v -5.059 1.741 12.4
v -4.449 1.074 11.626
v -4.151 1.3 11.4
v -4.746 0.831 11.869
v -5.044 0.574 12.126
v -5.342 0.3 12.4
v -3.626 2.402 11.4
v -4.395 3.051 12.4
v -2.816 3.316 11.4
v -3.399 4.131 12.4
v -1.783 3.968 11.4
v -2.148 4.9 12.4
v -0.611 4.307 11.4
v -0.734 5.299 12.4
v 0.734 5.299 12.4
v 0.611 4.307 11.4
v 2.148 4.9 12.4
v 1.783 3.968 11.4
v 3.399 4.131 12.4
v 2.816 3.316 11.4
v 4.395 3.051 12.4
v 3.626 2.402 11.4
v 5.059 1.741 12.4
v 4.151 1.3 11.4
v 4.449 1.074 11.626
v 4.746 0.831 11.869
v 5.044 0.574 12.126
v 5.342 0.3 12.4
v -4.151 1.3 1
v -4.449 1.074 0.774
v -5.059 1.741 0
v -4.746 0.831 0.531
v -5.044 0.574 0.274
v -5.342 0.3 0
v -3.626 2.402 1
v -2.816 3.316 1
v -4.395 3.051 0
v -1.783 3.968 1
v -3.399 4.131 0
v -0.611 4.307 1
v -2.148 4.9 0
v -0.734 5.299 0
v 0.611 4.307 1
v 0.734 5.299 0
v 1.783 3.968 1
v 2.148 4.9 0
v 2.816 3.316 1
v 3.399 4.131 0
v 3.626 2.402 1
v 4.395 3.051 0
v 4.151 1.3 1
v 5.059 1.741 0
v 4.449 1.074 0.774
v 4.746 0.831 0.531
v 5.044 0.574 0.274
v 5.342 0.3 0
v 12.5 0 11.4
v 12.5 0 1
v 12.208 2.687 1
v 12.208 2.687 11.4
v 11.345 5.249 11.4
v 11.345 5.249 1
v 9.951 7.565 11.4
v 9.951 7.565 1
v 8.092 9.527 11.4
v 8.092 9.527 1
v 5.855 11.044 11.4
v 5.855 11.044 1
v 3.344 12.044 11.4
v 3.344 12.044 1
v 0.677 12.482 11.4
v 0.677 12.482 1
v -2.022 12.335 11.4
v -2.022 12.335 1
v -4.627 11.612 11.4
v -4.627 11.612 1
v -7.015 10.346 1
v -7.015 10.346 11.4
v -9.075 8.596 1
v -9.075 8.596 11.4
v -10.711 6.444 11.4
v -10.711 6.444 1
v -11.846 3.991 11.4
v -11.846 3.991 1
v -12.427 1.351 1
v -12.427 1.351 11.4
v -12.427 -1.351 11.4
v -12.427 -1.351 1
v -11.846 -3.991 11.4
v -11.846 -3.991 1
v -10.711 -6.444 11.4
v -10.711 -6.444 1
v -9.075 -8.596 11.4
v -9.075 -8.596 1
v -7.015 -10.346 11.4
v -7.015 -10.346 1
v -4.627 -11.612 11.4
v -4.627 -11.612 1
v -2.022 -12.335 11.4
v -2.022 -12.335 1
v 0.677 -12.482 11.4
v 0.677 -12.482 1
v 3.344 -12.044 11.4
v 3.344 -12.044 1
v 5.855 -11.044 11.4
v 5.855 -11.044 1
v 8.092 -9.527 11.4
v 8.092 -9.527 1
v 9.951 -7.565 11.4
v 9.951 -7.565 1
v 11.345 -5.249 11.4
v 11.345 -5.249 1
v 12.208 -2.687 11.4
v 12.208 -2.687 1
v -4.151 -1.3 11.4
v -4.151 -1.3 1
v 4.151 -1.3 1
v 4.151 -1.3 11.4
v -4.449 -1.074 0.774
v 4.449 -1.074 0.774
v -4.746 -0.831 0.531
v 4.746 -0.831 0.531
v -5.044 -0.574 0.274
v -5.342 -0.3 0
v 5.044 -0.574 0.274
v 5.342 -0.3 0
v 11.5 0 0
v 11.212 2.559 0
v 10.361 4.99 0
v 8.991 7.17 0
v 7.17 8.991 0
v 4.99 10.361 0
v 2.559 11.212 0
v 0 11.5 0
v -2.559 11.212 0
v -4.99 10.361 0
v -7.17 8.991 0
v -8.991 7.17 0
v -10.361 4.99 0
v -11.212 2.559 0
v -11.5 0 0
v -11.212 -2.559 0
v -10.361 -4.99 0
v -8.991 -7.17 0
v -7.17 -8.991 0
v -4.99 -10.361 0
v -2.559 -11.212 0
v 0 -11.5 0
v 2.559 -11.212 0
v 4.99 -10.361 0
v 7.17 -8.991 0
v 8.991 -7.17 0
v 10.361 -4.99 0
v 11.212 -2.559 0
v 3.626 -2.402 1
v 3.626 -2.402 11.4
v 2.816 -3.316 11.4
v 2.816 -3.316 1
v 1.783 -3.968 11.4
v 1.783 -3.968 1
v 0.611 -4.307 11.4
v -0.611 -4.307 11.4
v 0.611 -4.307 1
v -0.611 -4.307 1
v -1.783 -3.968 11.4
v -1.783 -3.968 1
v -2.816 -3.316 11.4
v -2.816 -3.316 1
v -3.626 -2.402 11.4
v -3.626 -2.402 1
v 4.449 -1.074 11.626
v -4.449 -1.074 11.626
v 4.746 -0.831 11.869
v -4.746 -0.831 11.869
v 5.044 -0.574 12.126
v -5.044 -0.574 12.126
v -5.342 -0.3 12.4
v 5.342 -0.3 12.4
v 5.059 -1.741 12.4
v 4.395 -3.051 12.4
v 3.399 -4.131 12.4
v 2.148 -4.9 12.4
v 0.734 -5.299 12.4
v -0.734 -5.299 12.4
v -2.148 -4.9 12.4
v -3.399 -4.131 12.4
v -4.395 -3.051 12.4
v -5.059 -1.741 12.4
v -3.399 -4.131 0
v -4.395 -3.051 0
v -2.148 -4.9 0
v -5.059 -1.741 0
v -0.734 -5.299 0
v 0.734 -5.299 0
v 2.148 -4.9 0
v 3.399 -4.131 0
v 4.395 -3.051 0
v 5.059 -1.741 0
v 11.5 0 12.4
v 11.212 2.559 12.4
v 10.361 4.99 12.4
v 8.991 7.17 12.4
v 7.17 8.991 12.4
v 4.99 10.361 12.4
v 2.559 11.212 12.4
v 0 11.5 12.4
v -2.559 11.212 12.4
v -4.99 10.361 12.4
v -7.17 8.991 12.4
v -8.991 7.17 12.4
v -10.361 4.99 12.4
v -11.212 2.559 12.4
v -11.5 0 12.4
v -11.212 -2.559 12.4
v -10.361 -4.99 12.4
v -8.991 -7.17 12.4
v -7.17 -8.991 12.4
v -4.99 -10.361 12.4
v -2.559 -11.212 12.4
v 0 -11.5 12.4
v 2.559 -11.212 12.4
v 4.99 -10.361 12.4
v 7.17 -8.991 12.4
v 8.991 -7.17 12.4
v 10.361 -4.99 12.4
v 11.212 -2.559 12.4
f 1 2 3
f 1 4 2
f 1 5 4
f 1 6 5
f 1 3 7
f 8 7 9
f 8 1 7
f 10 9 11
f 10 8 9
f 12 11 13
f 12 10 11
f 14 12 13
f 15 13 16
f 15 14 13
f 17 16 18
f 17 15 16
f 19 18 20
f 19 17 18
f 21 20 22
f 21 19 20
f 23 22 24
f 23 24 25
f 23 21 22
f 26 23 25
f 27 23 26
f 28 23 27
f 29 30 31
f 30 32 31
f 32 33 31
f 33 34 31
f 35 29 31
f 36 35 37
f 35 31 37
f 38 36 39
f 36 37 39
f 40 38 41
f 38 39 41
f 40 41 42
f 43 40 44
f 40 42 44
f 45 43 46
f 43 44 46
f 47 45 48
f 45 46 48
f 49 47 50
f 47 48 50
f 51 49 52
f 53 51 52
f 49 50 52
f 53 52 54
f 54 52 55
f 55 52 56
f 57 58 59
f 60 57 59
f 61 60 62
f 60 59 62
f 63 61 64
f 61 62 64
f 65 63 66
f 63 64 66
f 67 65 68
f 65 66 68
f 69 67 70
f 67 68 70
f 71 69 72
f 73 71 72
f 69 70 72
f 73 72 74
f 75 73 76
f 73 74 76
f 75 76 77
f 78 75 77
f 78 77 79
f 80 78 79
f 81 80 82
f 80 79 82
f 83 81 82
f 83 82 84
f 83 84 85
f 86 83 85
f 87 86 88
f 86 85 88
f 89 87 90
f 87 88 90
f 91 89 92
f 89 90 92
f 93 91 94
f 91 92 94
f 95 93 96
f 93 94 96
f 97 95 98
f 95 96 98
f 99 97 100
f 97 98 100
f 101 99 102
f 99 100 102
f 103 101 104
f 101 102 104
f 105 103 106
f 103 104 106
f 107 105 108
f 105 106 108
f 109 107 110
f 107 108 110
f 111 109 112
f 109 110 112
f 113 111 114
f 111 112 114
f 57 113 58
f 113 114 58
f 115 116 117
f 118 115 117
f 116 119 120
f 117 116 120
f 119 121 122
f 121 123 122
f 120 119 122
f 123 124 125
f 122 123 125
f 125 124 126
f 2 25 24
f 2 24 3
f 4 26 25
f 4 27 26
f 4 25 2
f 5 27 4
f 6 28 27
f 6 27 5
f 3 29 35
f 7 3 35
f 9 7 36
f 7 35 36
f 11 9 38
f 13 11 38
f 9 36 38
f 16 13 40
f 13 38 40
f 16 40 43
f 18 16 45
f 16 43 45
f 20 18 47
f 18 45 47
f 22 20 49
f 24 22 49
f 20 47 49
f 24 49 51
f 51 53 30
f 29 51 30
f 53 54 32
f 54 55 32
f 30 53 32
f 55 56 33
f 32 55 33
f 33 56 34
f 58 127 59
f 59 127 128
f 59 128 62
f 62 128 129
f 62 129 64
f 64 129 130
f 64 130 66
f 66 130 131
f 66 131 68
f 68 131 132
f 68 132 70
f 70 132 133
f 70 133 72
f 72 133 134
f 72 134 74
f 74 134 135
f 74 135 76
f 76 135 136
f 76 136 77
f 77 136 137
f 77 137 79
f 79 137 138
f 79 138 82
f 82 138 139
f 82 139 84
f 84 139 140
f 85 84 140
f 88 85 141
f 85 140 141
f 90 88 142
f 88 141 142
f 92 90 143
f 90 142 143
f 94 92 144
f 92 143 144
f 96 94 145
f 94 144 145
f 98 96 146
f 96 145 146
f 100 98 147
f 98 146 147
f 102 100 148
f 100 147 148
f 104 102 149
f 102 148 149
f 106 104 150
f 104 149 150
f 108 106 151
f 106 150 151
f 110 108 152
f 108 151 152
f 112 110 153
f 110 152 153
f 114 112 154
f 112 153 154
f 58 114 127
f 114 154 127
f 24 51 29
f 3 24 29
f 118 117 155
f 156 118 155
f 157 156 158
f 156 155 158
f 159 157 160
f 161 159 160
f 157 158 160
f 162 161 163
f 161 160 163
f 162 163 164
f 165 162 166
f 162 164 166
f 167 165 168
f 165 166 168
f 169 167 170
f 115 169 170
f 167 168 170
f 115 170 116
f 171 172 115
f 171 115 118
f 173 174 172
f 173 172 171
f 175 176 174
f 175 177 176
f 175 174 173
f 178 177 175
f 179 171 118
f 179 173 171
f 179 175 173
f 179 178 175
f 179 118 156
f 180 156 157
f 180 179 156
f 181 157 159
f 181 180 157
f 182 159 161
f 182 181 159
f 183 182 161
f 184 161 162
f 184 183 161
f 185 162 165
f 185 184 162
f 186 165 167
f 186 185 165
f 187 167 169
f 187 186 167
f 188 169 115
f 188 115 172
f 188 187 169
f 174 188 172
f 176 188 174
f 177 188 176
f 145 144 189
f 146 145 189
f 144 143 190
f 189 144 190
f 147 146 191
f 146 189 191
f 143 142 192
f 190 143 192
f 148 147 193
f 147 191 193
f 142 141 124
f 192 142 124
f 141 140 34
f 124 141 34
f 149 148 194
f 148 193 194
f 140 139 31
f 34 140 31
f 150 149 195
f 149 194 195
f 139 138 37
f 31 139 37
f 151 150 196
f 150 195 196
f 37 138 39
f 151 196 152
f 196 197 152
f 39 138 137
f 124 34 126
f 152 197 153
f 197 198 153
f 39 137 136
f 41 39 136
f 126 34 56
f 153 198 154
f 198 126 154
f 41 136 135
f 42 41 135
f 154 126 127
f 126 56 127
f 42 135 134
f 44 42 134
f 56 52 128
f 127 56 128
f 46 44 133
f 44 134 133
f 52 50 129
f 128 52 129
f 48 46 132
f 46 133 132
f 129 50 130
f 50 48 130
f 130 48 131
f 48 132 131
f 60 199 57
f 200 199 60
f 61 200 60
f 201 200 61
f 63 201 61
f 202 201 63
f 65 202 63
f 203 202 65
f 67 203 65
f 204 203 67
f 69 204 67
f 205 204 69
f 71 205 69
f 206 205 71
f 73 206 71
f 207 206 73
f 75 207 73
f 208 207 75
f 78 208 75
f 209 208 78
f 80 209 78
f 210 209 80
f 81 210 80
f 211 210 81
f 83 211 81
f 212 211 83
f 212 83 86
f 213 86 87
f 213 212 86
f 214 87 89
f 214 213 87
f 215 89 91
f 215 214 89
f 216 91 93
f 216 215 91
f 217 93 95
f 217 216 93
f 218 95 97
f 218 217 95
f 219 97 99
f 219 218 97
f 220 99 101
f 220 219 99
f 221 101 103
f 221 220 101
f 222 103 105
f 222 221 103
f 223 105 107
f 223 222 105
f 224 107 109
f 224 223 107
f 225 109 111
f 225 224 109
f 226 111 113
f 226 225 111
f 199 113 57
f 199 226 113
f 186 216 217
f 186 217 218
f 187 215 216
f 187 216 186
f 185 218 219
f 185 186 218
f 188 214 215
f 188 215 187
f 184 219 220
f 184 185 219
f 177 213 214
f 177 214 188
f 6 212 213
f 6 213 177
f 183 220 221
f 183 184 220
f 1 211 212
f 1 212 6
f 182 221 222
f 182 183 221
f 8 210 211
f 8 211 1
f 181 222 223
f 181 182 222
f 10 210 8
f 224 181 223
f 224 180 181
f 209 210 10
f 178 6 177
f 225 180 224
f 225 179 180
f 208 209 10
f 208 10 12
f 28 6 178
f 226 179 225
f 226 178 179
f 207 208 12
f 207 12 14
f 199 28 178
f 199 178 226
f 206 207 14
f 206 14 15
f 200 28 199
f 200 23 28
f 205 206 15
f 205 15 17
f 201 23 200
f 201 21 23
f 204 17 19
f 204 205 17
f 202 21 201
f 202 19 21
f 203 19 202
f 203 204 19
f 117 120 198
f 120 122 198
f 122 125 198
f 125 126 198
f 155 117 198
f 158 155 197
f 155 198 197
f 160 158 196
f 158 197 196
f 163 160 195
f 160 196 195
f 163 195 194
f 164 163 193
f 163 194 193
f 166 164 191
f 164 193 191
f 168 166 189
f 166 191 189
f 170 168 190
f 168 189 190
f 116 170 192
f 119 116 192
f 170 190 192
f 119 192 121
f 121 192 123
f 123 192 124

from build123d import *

# Parameters (mm, degrees)
F0_R     = 12.5
F1_DEPTH = 12.4
F2_SIZE  = 1


with BuildPart() as f1:
    # F0 (on Top) → F1 (new body)
    with BuildSketch(Plane.XY):
        Circle(F0_R)
        with BuildLine():
            ThreePointArc((-4.1512046444, 1.3), (0, 4.35), (4.1512046444, 1.3))
            Line((4.1512046444, 1.3), (5, 1.3))
            Line((5, 1.3), (5, -1.3))
            Line((5, -1.3), (4.1512046444, -1.3))
            ThreePointArc((4.1512046444, -1.3), (0, -4.35), (-4.1512046444, -1.3))
            Line((-4.1512046444, -1.3), (-5, -1.3))
            Line((-5, -1.3), (-5, 1.3))
            Line((-5, 1.3), (-4.1512046444, 1.3))
        make_face(mode=Mode.SUBTRACT)
        with BuildLine():
            ThreePointArc((4.1512046444, -1.3), (4.3000139653, -0.657556004), (4.35, 0))
            ThreePointArc((4.35, 0), (4.3000139653, 0.657556004), (4.1512046444, 1.3))
            Line((4.1512046444, 1.3), (-4.1512046444, 1.3))
            ThreePointArc((-4.1512046444, 1.3), (-4.35, 0), (-4.1512046444, -1.3))
            Line((-4.1512046444, -1.3), (4.1512046444, -1.3))
        make_face()
        with BuildLine():
            ThreePointArc((4.1512046444, 1.3), (4.3000139653, 0.657556004), (4.35, 0))
            ThreePointArc((4.35, 0), (4.3000139653, -0.657556004), (4.1512046444, -1.3))
            Line((4.1512046444, -1.3), (5, -1.3))
            Line((5, -1.3), (5, 1.3))
            Line((5, 1.3), (4.1512046444, 1.3))
        make_face()
        with BuildLine():
            ThreePointArc((-4.1512046444, -1.3), (-4.35, 0), (-4.1512046444, 1.3))
            Line((-4.1512046444, 1.3), (-5, 1.3))
            Line((-5, 1.3), (-5, -1.3))
            Line((-5, -1.3), (-4.1512046444, -1.3))
        make_face()
    extrude(amount=F1_DEPTH)

    # F2
    f2_edges = [f1.edges().sort_by_distance(p)[0] for p in [
        (-12.5, 0, 12.4),
        (0, -4.35, 12.4),
        (0, -1.3, 12.4),
        (0, 1.3, 12.4),
        (0, 4.35, 12.4),
        (-12.5, 0, 0),
        (0, 1.3, 0),
        (0, 4.35, 0),
        (0, -1.3, 0),
        (0, -4.35, 0),
    ]]
    chamfer(f2_edges, length=F2_SIZE)


solid = f1.part
